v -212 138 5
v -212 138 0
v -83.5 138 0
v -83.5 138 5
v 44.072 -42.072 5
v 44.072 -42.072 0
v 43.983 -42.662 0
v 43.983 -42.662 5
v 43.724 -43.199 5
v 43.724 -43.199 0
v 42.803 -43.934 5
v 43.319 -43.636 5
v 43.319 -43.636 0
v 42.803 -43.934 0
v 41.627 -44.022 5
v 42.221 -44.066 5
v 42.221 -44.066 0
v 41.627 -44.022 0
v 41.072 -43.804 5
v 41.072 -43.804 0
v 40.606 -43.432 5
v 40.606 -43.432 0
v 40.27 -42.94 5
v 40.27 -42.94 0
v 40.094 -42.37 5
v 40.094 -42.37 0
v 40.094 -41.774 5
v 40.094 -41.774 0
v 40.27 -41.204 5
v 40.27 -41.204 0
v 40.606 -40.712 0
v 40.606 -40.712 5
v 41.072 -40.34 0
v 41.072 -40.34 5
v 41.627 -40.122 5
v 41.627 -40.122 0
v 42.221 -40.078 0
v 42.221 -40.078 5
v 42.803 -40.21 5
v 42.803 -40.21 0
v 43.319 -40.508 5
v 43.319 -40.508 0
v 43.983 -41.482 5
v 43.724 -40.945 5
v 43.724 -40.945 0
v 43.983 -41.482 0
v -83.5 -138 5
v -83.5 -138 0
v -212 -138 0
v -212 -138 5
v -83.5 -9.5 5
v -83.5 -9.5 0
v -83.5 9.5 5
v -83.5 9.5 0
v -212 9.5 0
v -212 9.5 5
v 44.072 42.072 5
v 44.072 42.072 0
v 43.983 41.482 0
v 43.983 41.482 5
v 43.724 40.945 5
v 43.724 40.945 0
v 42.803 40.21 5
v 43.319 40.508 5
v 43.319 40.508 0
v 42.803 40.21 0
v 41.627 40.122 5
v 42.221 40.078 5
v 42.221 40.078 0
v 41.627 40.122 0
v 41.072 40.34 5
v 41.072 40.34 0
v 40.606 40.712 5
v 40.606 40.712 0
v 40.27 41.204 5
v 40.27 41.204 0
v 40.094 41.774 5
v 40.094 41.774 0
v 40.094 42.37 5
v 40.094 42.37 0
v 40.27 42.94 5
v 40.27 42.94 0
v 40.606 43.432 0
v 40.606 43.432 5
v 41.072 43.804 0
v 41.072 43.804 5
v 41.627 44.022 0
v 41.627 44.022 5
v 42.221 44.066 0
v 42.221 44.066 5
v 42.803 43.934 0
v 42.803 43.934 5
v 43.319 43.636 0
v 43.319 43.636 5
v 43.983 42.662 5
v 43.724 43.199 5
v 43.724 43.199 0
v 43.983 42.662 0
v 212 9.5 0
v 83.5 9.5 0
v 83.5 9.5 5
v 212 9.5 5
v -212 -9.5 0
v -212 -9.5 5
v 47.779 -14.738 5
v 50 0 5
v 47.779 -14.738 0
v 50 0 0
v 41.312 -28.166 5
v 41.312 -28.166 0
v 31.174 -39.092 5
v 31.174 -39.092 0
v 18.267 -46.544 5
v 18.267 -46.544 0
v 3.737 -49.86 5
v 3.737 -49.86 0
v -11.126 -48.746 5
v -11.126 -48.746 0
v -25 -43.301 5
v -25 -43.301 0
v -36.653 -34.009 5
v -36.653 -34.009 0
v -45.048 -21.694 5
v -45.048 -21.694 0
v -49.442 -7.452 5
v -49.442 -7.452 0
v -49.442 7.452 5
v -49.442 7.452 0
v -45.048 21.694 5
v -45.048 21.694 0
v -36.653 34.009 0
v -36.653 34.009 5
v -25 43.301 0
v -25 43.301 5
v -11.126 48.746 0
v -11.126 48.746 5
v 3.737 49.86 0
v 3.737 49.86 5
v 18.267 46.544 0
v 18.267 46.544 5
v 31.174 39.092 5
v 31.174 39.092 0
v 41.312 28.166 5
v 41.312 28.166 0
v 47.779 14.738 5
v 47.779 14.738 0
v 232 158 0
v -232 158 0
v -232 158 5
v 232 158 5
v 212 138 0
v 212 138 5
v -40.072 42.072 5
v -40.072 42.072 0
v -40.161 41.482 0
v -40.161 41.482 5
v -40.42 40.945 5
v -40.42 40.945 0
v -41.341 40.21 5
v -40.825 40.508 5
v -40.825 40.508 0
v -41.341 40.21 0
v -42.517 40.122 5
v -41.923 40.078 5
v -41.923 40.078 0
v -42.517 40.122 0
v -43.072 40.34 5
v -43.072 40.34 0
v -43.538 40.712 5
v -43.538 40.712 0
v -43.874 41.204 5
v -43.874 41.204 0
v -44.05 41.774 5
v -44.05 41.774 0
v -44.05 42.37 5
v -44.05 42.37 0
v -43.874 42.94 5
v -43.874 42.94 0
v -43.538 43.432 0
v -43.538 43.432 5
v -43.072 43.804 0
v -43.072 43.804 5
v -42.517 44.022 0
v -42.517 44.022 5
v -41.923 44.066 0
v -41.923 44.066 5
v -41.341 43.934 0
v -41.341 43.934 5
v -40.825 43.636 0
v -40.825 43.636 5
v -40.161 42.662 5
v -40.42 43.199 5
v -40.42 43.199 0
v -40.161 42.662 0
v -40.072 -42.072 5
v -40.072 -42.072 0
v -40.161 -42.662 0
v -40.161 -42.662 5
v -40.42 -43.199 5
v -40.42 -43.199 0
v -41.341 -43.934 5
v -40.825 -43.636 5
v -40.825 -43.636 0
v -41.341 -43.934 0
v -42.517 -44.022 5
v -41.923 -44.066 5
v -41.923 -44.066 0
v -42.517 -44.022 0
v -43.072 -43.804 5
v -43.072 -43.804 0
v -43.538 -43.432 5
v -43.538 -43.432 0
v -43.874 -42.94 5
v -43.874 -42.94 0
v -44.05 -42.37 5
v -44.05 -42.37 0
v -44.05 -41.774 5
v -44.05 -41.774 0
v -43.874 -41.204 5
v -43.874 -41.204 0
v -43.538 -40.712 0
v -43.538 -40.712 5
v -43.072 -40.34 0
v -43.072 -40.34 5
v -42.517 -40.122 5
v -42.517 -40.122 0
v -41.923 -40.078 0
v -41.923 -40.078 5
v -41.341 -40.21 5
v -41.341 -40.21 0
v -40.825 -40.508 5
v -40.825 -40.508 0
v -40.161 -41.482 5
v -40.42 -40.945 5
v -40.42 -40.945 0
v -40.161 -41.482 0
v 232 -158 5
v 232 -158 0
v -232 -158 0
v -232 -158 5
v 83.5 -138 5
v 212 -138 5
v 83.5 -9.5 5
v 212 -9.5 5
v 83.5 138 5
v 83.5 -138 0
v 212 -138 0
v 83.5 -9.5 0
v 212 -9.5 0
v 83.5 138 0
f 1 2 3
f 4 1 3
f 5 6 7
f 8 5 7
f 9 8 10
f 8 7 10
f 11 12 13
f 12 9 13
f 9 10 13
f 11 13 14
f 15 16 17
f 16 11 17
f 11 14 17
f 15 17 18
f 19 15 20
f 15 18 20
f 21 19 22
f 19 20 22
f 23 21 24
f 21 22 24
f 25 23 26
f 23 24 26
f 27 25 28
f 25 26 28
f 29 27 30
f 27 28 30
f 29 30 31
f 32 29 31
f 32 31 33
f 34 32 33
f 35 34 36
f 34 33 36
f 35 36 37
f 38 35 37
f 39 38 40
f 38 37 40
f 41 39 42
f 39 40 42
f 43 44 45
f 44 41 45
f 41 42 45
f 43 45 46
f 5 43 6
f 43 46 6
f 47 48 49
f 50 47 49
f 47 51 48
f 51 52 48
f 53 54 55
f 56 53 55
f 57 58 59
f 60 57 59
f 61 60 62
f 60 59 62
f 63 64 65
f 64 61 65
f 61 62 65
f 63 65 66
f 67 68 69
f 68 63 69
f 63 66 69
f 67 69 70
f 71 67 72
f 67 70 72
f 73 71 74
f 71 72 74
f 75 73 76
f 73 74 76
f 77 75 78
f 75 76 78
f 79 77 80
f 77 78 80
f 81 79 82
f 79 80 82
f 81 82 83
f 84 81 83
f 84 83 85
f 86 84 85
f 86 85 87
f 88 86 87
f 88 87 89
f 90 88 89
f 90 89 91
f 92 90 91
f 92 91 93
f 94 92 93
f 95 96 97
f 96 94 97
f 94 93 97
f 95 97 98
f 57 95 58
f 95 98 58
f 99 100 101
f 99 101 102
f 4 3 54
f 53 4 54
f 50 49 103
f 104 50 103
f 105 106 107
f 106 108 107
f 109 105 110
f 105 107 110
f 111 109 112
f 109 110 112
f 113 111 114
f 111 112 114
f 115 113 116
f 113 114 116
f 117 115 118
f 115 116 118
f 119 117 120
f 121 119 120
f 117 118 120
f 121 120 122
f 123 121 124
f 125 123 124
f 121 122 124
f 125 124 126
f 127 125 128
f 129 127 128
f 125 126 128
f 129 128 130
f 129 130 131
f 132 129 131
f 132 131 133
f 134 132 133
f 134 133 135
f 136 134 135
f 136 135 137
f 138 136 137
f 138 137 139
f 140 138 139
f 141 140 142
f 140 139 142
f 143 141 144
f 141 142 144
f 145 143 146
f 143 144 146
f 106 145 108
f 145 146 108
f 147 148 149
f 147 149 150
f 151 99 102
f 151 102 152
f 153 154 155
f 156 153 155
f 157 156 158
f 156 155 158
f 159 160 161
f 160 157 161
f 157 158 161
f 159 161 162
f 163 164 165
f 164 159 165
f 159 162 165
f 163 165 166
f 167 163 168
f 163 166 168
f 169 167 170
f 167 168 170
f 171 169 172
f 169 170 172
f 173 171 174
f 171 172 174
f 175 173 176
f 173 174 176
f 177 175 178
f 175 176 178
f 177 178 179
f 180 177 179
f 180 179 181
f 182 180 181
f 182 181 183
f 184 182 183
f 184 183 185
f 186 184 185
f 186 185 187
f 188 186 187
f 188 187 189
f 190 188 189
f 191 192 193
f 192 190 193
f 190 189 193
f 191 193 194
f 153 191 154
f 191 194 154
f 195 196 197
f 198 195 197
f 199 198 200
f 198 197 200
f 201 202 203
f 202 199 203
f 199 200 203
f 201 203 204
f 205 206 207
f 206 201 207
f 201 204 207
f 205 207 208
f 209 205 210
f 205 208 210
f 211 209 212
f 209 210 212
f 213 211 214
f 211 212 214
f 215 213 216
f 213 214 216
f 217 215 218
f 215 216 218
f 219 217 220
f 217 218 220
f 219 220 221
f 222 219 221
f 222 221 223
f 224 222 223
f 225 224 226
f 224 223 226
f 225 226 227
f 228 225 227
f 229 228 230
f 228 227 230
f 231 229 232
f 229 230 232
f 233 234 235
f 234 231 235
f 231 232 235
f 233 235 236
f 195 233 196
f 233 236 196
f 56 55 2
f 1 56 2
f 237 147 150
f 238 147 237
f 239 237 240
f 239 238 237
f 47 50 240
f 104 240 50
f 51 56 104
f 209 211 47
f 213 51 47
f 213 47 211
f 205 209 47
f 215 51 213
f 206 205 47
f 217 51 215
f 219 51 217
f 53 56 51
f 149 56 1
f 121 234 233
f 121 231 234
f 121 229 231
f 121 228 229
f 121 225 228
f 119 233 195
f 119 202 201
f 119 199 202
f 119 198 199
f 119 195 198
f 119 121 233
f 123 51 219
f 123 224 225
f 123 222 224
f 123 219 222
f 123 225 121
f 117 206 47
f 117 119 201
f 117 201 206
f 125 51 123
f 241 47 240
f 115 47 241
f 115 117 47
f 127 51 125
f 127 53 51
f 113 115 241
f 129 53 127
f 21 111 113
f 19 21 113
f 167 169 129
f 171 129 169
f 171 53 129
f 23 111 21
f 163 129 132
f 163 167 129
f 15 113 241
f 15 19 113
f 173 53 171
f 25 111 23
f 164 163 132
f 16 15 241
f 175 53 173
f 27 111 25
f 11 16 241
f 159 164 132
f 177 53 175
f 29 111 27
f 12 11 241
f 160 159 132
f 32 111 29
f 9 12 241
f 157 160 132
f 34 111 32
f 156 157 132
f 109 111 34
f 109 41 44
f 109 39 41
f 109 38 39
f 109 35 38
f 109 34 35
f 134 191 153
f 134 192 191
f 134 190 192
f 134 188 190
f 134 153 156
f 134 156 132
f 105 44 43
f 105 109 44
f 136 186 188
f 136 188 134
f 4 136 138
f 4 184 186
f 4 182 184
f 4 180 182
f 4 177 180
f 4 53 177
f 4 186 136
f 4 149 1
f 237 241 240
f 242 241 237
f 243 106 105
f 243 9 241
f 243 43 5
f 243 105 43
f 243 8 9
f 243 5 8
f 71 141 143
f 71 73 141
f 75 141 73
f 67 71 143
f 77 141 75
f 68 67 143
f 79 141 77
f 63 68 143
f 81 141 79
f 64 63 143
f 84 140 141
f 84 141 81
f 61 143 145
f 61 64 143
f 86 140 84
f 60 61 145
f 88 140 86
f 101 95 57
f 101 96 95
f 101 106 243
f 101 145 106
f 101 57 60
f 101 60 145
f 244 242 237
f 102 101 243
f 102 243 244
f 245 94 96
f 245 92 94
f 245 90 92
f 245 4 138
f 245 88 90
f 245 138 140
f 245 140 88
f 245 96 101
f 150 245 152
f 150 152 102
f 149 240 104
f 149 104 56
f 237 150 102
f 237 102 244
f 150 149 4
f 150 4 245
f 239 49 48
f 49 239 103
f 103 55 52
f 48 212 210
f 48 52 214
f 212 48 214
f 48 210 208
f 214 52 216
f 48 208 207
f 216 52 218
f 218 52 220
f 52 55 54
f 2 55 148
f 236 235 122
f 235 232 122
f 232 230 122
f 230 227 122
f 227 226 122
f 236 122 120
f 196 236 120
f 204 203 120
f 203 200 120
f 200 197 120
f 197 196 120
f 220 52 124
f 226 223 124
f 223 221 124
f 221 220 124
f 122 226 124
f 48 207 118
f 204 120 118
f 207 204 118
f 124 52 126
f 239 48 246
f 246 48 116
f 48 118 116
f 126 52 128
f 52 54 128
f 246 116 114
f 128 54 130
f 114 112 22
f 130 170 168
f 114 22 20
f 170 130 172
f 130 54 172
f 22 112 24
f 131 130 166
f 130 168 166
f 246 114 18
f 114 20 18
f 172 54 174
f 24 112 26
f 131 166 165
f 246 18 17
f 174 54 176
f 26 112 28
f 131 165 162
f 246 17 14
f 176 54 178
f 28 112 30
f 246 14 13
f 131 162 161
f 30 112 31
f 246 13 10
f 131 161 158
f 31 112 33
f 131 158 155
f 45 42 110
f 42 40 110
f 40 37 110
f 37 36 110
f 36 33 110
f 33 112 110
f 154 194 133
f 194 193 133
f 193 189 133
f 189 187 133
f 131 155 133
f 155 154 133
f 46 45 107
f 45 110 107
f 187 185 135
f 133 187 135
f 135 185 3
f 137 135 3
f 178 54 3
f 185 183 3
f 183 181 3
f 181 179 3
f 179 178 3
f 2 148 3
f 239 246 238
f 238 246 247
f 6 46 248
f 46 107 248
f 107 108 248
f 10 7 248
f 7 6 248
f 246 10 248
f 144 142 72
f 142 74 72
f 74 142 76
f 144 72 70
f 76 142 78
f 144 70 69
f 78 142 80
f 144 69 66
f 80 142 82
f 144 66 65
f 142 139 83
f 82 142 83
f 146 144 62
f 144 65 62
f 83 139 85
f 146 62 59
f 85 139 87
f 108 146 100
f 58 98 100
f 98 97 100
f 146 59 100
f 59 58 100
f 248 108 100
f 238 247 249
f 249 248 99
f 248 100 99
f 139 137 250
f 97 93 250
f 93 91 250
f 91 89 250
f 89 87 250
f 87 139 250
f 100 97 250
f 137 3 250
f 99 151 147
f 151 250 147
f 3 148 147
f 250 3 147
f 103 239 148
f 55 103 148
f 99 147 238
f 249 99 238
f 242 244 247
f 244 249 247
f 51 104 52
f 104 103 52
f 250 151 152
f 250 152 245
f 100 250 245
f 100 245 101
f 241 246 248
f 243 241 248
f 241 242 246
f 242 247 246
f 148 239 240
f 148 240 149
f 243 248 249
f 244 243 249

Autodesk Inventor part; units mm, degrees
ref_plane "YZ Plane" through (0, 0, 0) normal (1, 0, 0) x (0, 1, 0)
ref_plane "XZ Plane" through (0, 0, 0) normal (0, 1, 0) x (-1, 0, 0)
ref_plane "XY Plane" through (0, 0, 0) normal (0, 0, 1) x (1, 0, 0)
sketch "스케치3" plane through (0, 0, 0) normal (0, 0, 1) x (1, 0, 0)
  line L0 (-232, 158) -> (232, 158)
  line L1 (232, 158) -> (232, -158)
  line L2 (232, -158) -> (-232, -158)
  line L3 (-232, -158) -> (-232, 158)
  line L4 (-212, -9.5) -> (-83.5, -9.5)
  line L5 (-83.5, -9.5) -> (-83.5, -138)
  line L6 (-83.5, -138) -> (-212, -138)
  line L7 (-212, -138) -> (-212, -9.5)
  line L8 (-212, 138) -> (-83.5, 138)
  line L9 (-83.5, 138) -> (-83.5, 9.5)
  line L10 (-83.5, 9.5) -> (-212, 9.5)
  line L11 (-212, 9.5) -> (-212, 138)
  line L12 (212, 138) -> (83.5, 138)
  line L13 (83.5, 138) -> (83.5, 9.5)
  line L14 (83.5, 9.5) -> (212, 9.5)
  line L15 (212, 9.5) -> (212, 138)
  line L16 (212, -138) -> (83.5, -138)
  line L17 (83.5, -138) -> (83.5, -9.5)
  line L18 (83.5, -9.5) -> (212, -9.5)
  line L19 (212, -9.5) -> (212, -138)
  circle A0 centre (-42.072, 42.072) radius 2
  circle A1 centre (42.072, 42.072) radius 2
  circle A2 centre (-42.072, -42.072) radius 2
  circle A3 centre (42.072, -42.072) radius 2
  line L20 (0, -221.2) -> (0, 221.2) projected
  line L21 (-324.8, 0) -> (324.8, 0) projected
  circle A4 centre (0, 0) radius 50
  point P0 (232, 0)
  point P1 (212, 73.75)
  dimension "d0" = 316
  dimension "d1" = 464
  dimension "d2" = 232
  dimension "d3" = 158
  dimension "d4" = 128.5
  dimension "d5" = 128.5
  dimension "d6" = 20
  dimension "d7" = 20
  dimension "d8" = 128.5
  dimension "d9" = 128.5
  dimension "d10" = 20
  dimension "d11" = 20
  dimension "d12" = 128.5
  dimension "d13" = 128.5
  dimension "d14" = 20
  dimension "d15" = 128.5
  dimension "d16" = 128.5
  dimension "d17" = 20
  dimension "d18" = 20
  dimension "d19" = 4
  dimension "d20" = 4
  dimension "d21" = 4
  dimension "d22" = 4
  dimension "d23" = 42.072
  dimension "d24" = 42.072
  dimension "d25" = 42.072
  dimension "d26" = 42.072
  dimension "d27" = 42.072
  dimension "d28" = 42.072
  dimension "d29" = 42.072
  dimension "d30" = 42.072
  dimension "d31" = 100
extrude "돌출1" add sketch "스케치3" along normal blind 5 contours L0 L20 A4 L21 L3 | L0 L1 L21 A4 L20 | L21 A4 L20 L2 L3 | L1 L2 L20 A4 L21
properties part number "가로세로"
